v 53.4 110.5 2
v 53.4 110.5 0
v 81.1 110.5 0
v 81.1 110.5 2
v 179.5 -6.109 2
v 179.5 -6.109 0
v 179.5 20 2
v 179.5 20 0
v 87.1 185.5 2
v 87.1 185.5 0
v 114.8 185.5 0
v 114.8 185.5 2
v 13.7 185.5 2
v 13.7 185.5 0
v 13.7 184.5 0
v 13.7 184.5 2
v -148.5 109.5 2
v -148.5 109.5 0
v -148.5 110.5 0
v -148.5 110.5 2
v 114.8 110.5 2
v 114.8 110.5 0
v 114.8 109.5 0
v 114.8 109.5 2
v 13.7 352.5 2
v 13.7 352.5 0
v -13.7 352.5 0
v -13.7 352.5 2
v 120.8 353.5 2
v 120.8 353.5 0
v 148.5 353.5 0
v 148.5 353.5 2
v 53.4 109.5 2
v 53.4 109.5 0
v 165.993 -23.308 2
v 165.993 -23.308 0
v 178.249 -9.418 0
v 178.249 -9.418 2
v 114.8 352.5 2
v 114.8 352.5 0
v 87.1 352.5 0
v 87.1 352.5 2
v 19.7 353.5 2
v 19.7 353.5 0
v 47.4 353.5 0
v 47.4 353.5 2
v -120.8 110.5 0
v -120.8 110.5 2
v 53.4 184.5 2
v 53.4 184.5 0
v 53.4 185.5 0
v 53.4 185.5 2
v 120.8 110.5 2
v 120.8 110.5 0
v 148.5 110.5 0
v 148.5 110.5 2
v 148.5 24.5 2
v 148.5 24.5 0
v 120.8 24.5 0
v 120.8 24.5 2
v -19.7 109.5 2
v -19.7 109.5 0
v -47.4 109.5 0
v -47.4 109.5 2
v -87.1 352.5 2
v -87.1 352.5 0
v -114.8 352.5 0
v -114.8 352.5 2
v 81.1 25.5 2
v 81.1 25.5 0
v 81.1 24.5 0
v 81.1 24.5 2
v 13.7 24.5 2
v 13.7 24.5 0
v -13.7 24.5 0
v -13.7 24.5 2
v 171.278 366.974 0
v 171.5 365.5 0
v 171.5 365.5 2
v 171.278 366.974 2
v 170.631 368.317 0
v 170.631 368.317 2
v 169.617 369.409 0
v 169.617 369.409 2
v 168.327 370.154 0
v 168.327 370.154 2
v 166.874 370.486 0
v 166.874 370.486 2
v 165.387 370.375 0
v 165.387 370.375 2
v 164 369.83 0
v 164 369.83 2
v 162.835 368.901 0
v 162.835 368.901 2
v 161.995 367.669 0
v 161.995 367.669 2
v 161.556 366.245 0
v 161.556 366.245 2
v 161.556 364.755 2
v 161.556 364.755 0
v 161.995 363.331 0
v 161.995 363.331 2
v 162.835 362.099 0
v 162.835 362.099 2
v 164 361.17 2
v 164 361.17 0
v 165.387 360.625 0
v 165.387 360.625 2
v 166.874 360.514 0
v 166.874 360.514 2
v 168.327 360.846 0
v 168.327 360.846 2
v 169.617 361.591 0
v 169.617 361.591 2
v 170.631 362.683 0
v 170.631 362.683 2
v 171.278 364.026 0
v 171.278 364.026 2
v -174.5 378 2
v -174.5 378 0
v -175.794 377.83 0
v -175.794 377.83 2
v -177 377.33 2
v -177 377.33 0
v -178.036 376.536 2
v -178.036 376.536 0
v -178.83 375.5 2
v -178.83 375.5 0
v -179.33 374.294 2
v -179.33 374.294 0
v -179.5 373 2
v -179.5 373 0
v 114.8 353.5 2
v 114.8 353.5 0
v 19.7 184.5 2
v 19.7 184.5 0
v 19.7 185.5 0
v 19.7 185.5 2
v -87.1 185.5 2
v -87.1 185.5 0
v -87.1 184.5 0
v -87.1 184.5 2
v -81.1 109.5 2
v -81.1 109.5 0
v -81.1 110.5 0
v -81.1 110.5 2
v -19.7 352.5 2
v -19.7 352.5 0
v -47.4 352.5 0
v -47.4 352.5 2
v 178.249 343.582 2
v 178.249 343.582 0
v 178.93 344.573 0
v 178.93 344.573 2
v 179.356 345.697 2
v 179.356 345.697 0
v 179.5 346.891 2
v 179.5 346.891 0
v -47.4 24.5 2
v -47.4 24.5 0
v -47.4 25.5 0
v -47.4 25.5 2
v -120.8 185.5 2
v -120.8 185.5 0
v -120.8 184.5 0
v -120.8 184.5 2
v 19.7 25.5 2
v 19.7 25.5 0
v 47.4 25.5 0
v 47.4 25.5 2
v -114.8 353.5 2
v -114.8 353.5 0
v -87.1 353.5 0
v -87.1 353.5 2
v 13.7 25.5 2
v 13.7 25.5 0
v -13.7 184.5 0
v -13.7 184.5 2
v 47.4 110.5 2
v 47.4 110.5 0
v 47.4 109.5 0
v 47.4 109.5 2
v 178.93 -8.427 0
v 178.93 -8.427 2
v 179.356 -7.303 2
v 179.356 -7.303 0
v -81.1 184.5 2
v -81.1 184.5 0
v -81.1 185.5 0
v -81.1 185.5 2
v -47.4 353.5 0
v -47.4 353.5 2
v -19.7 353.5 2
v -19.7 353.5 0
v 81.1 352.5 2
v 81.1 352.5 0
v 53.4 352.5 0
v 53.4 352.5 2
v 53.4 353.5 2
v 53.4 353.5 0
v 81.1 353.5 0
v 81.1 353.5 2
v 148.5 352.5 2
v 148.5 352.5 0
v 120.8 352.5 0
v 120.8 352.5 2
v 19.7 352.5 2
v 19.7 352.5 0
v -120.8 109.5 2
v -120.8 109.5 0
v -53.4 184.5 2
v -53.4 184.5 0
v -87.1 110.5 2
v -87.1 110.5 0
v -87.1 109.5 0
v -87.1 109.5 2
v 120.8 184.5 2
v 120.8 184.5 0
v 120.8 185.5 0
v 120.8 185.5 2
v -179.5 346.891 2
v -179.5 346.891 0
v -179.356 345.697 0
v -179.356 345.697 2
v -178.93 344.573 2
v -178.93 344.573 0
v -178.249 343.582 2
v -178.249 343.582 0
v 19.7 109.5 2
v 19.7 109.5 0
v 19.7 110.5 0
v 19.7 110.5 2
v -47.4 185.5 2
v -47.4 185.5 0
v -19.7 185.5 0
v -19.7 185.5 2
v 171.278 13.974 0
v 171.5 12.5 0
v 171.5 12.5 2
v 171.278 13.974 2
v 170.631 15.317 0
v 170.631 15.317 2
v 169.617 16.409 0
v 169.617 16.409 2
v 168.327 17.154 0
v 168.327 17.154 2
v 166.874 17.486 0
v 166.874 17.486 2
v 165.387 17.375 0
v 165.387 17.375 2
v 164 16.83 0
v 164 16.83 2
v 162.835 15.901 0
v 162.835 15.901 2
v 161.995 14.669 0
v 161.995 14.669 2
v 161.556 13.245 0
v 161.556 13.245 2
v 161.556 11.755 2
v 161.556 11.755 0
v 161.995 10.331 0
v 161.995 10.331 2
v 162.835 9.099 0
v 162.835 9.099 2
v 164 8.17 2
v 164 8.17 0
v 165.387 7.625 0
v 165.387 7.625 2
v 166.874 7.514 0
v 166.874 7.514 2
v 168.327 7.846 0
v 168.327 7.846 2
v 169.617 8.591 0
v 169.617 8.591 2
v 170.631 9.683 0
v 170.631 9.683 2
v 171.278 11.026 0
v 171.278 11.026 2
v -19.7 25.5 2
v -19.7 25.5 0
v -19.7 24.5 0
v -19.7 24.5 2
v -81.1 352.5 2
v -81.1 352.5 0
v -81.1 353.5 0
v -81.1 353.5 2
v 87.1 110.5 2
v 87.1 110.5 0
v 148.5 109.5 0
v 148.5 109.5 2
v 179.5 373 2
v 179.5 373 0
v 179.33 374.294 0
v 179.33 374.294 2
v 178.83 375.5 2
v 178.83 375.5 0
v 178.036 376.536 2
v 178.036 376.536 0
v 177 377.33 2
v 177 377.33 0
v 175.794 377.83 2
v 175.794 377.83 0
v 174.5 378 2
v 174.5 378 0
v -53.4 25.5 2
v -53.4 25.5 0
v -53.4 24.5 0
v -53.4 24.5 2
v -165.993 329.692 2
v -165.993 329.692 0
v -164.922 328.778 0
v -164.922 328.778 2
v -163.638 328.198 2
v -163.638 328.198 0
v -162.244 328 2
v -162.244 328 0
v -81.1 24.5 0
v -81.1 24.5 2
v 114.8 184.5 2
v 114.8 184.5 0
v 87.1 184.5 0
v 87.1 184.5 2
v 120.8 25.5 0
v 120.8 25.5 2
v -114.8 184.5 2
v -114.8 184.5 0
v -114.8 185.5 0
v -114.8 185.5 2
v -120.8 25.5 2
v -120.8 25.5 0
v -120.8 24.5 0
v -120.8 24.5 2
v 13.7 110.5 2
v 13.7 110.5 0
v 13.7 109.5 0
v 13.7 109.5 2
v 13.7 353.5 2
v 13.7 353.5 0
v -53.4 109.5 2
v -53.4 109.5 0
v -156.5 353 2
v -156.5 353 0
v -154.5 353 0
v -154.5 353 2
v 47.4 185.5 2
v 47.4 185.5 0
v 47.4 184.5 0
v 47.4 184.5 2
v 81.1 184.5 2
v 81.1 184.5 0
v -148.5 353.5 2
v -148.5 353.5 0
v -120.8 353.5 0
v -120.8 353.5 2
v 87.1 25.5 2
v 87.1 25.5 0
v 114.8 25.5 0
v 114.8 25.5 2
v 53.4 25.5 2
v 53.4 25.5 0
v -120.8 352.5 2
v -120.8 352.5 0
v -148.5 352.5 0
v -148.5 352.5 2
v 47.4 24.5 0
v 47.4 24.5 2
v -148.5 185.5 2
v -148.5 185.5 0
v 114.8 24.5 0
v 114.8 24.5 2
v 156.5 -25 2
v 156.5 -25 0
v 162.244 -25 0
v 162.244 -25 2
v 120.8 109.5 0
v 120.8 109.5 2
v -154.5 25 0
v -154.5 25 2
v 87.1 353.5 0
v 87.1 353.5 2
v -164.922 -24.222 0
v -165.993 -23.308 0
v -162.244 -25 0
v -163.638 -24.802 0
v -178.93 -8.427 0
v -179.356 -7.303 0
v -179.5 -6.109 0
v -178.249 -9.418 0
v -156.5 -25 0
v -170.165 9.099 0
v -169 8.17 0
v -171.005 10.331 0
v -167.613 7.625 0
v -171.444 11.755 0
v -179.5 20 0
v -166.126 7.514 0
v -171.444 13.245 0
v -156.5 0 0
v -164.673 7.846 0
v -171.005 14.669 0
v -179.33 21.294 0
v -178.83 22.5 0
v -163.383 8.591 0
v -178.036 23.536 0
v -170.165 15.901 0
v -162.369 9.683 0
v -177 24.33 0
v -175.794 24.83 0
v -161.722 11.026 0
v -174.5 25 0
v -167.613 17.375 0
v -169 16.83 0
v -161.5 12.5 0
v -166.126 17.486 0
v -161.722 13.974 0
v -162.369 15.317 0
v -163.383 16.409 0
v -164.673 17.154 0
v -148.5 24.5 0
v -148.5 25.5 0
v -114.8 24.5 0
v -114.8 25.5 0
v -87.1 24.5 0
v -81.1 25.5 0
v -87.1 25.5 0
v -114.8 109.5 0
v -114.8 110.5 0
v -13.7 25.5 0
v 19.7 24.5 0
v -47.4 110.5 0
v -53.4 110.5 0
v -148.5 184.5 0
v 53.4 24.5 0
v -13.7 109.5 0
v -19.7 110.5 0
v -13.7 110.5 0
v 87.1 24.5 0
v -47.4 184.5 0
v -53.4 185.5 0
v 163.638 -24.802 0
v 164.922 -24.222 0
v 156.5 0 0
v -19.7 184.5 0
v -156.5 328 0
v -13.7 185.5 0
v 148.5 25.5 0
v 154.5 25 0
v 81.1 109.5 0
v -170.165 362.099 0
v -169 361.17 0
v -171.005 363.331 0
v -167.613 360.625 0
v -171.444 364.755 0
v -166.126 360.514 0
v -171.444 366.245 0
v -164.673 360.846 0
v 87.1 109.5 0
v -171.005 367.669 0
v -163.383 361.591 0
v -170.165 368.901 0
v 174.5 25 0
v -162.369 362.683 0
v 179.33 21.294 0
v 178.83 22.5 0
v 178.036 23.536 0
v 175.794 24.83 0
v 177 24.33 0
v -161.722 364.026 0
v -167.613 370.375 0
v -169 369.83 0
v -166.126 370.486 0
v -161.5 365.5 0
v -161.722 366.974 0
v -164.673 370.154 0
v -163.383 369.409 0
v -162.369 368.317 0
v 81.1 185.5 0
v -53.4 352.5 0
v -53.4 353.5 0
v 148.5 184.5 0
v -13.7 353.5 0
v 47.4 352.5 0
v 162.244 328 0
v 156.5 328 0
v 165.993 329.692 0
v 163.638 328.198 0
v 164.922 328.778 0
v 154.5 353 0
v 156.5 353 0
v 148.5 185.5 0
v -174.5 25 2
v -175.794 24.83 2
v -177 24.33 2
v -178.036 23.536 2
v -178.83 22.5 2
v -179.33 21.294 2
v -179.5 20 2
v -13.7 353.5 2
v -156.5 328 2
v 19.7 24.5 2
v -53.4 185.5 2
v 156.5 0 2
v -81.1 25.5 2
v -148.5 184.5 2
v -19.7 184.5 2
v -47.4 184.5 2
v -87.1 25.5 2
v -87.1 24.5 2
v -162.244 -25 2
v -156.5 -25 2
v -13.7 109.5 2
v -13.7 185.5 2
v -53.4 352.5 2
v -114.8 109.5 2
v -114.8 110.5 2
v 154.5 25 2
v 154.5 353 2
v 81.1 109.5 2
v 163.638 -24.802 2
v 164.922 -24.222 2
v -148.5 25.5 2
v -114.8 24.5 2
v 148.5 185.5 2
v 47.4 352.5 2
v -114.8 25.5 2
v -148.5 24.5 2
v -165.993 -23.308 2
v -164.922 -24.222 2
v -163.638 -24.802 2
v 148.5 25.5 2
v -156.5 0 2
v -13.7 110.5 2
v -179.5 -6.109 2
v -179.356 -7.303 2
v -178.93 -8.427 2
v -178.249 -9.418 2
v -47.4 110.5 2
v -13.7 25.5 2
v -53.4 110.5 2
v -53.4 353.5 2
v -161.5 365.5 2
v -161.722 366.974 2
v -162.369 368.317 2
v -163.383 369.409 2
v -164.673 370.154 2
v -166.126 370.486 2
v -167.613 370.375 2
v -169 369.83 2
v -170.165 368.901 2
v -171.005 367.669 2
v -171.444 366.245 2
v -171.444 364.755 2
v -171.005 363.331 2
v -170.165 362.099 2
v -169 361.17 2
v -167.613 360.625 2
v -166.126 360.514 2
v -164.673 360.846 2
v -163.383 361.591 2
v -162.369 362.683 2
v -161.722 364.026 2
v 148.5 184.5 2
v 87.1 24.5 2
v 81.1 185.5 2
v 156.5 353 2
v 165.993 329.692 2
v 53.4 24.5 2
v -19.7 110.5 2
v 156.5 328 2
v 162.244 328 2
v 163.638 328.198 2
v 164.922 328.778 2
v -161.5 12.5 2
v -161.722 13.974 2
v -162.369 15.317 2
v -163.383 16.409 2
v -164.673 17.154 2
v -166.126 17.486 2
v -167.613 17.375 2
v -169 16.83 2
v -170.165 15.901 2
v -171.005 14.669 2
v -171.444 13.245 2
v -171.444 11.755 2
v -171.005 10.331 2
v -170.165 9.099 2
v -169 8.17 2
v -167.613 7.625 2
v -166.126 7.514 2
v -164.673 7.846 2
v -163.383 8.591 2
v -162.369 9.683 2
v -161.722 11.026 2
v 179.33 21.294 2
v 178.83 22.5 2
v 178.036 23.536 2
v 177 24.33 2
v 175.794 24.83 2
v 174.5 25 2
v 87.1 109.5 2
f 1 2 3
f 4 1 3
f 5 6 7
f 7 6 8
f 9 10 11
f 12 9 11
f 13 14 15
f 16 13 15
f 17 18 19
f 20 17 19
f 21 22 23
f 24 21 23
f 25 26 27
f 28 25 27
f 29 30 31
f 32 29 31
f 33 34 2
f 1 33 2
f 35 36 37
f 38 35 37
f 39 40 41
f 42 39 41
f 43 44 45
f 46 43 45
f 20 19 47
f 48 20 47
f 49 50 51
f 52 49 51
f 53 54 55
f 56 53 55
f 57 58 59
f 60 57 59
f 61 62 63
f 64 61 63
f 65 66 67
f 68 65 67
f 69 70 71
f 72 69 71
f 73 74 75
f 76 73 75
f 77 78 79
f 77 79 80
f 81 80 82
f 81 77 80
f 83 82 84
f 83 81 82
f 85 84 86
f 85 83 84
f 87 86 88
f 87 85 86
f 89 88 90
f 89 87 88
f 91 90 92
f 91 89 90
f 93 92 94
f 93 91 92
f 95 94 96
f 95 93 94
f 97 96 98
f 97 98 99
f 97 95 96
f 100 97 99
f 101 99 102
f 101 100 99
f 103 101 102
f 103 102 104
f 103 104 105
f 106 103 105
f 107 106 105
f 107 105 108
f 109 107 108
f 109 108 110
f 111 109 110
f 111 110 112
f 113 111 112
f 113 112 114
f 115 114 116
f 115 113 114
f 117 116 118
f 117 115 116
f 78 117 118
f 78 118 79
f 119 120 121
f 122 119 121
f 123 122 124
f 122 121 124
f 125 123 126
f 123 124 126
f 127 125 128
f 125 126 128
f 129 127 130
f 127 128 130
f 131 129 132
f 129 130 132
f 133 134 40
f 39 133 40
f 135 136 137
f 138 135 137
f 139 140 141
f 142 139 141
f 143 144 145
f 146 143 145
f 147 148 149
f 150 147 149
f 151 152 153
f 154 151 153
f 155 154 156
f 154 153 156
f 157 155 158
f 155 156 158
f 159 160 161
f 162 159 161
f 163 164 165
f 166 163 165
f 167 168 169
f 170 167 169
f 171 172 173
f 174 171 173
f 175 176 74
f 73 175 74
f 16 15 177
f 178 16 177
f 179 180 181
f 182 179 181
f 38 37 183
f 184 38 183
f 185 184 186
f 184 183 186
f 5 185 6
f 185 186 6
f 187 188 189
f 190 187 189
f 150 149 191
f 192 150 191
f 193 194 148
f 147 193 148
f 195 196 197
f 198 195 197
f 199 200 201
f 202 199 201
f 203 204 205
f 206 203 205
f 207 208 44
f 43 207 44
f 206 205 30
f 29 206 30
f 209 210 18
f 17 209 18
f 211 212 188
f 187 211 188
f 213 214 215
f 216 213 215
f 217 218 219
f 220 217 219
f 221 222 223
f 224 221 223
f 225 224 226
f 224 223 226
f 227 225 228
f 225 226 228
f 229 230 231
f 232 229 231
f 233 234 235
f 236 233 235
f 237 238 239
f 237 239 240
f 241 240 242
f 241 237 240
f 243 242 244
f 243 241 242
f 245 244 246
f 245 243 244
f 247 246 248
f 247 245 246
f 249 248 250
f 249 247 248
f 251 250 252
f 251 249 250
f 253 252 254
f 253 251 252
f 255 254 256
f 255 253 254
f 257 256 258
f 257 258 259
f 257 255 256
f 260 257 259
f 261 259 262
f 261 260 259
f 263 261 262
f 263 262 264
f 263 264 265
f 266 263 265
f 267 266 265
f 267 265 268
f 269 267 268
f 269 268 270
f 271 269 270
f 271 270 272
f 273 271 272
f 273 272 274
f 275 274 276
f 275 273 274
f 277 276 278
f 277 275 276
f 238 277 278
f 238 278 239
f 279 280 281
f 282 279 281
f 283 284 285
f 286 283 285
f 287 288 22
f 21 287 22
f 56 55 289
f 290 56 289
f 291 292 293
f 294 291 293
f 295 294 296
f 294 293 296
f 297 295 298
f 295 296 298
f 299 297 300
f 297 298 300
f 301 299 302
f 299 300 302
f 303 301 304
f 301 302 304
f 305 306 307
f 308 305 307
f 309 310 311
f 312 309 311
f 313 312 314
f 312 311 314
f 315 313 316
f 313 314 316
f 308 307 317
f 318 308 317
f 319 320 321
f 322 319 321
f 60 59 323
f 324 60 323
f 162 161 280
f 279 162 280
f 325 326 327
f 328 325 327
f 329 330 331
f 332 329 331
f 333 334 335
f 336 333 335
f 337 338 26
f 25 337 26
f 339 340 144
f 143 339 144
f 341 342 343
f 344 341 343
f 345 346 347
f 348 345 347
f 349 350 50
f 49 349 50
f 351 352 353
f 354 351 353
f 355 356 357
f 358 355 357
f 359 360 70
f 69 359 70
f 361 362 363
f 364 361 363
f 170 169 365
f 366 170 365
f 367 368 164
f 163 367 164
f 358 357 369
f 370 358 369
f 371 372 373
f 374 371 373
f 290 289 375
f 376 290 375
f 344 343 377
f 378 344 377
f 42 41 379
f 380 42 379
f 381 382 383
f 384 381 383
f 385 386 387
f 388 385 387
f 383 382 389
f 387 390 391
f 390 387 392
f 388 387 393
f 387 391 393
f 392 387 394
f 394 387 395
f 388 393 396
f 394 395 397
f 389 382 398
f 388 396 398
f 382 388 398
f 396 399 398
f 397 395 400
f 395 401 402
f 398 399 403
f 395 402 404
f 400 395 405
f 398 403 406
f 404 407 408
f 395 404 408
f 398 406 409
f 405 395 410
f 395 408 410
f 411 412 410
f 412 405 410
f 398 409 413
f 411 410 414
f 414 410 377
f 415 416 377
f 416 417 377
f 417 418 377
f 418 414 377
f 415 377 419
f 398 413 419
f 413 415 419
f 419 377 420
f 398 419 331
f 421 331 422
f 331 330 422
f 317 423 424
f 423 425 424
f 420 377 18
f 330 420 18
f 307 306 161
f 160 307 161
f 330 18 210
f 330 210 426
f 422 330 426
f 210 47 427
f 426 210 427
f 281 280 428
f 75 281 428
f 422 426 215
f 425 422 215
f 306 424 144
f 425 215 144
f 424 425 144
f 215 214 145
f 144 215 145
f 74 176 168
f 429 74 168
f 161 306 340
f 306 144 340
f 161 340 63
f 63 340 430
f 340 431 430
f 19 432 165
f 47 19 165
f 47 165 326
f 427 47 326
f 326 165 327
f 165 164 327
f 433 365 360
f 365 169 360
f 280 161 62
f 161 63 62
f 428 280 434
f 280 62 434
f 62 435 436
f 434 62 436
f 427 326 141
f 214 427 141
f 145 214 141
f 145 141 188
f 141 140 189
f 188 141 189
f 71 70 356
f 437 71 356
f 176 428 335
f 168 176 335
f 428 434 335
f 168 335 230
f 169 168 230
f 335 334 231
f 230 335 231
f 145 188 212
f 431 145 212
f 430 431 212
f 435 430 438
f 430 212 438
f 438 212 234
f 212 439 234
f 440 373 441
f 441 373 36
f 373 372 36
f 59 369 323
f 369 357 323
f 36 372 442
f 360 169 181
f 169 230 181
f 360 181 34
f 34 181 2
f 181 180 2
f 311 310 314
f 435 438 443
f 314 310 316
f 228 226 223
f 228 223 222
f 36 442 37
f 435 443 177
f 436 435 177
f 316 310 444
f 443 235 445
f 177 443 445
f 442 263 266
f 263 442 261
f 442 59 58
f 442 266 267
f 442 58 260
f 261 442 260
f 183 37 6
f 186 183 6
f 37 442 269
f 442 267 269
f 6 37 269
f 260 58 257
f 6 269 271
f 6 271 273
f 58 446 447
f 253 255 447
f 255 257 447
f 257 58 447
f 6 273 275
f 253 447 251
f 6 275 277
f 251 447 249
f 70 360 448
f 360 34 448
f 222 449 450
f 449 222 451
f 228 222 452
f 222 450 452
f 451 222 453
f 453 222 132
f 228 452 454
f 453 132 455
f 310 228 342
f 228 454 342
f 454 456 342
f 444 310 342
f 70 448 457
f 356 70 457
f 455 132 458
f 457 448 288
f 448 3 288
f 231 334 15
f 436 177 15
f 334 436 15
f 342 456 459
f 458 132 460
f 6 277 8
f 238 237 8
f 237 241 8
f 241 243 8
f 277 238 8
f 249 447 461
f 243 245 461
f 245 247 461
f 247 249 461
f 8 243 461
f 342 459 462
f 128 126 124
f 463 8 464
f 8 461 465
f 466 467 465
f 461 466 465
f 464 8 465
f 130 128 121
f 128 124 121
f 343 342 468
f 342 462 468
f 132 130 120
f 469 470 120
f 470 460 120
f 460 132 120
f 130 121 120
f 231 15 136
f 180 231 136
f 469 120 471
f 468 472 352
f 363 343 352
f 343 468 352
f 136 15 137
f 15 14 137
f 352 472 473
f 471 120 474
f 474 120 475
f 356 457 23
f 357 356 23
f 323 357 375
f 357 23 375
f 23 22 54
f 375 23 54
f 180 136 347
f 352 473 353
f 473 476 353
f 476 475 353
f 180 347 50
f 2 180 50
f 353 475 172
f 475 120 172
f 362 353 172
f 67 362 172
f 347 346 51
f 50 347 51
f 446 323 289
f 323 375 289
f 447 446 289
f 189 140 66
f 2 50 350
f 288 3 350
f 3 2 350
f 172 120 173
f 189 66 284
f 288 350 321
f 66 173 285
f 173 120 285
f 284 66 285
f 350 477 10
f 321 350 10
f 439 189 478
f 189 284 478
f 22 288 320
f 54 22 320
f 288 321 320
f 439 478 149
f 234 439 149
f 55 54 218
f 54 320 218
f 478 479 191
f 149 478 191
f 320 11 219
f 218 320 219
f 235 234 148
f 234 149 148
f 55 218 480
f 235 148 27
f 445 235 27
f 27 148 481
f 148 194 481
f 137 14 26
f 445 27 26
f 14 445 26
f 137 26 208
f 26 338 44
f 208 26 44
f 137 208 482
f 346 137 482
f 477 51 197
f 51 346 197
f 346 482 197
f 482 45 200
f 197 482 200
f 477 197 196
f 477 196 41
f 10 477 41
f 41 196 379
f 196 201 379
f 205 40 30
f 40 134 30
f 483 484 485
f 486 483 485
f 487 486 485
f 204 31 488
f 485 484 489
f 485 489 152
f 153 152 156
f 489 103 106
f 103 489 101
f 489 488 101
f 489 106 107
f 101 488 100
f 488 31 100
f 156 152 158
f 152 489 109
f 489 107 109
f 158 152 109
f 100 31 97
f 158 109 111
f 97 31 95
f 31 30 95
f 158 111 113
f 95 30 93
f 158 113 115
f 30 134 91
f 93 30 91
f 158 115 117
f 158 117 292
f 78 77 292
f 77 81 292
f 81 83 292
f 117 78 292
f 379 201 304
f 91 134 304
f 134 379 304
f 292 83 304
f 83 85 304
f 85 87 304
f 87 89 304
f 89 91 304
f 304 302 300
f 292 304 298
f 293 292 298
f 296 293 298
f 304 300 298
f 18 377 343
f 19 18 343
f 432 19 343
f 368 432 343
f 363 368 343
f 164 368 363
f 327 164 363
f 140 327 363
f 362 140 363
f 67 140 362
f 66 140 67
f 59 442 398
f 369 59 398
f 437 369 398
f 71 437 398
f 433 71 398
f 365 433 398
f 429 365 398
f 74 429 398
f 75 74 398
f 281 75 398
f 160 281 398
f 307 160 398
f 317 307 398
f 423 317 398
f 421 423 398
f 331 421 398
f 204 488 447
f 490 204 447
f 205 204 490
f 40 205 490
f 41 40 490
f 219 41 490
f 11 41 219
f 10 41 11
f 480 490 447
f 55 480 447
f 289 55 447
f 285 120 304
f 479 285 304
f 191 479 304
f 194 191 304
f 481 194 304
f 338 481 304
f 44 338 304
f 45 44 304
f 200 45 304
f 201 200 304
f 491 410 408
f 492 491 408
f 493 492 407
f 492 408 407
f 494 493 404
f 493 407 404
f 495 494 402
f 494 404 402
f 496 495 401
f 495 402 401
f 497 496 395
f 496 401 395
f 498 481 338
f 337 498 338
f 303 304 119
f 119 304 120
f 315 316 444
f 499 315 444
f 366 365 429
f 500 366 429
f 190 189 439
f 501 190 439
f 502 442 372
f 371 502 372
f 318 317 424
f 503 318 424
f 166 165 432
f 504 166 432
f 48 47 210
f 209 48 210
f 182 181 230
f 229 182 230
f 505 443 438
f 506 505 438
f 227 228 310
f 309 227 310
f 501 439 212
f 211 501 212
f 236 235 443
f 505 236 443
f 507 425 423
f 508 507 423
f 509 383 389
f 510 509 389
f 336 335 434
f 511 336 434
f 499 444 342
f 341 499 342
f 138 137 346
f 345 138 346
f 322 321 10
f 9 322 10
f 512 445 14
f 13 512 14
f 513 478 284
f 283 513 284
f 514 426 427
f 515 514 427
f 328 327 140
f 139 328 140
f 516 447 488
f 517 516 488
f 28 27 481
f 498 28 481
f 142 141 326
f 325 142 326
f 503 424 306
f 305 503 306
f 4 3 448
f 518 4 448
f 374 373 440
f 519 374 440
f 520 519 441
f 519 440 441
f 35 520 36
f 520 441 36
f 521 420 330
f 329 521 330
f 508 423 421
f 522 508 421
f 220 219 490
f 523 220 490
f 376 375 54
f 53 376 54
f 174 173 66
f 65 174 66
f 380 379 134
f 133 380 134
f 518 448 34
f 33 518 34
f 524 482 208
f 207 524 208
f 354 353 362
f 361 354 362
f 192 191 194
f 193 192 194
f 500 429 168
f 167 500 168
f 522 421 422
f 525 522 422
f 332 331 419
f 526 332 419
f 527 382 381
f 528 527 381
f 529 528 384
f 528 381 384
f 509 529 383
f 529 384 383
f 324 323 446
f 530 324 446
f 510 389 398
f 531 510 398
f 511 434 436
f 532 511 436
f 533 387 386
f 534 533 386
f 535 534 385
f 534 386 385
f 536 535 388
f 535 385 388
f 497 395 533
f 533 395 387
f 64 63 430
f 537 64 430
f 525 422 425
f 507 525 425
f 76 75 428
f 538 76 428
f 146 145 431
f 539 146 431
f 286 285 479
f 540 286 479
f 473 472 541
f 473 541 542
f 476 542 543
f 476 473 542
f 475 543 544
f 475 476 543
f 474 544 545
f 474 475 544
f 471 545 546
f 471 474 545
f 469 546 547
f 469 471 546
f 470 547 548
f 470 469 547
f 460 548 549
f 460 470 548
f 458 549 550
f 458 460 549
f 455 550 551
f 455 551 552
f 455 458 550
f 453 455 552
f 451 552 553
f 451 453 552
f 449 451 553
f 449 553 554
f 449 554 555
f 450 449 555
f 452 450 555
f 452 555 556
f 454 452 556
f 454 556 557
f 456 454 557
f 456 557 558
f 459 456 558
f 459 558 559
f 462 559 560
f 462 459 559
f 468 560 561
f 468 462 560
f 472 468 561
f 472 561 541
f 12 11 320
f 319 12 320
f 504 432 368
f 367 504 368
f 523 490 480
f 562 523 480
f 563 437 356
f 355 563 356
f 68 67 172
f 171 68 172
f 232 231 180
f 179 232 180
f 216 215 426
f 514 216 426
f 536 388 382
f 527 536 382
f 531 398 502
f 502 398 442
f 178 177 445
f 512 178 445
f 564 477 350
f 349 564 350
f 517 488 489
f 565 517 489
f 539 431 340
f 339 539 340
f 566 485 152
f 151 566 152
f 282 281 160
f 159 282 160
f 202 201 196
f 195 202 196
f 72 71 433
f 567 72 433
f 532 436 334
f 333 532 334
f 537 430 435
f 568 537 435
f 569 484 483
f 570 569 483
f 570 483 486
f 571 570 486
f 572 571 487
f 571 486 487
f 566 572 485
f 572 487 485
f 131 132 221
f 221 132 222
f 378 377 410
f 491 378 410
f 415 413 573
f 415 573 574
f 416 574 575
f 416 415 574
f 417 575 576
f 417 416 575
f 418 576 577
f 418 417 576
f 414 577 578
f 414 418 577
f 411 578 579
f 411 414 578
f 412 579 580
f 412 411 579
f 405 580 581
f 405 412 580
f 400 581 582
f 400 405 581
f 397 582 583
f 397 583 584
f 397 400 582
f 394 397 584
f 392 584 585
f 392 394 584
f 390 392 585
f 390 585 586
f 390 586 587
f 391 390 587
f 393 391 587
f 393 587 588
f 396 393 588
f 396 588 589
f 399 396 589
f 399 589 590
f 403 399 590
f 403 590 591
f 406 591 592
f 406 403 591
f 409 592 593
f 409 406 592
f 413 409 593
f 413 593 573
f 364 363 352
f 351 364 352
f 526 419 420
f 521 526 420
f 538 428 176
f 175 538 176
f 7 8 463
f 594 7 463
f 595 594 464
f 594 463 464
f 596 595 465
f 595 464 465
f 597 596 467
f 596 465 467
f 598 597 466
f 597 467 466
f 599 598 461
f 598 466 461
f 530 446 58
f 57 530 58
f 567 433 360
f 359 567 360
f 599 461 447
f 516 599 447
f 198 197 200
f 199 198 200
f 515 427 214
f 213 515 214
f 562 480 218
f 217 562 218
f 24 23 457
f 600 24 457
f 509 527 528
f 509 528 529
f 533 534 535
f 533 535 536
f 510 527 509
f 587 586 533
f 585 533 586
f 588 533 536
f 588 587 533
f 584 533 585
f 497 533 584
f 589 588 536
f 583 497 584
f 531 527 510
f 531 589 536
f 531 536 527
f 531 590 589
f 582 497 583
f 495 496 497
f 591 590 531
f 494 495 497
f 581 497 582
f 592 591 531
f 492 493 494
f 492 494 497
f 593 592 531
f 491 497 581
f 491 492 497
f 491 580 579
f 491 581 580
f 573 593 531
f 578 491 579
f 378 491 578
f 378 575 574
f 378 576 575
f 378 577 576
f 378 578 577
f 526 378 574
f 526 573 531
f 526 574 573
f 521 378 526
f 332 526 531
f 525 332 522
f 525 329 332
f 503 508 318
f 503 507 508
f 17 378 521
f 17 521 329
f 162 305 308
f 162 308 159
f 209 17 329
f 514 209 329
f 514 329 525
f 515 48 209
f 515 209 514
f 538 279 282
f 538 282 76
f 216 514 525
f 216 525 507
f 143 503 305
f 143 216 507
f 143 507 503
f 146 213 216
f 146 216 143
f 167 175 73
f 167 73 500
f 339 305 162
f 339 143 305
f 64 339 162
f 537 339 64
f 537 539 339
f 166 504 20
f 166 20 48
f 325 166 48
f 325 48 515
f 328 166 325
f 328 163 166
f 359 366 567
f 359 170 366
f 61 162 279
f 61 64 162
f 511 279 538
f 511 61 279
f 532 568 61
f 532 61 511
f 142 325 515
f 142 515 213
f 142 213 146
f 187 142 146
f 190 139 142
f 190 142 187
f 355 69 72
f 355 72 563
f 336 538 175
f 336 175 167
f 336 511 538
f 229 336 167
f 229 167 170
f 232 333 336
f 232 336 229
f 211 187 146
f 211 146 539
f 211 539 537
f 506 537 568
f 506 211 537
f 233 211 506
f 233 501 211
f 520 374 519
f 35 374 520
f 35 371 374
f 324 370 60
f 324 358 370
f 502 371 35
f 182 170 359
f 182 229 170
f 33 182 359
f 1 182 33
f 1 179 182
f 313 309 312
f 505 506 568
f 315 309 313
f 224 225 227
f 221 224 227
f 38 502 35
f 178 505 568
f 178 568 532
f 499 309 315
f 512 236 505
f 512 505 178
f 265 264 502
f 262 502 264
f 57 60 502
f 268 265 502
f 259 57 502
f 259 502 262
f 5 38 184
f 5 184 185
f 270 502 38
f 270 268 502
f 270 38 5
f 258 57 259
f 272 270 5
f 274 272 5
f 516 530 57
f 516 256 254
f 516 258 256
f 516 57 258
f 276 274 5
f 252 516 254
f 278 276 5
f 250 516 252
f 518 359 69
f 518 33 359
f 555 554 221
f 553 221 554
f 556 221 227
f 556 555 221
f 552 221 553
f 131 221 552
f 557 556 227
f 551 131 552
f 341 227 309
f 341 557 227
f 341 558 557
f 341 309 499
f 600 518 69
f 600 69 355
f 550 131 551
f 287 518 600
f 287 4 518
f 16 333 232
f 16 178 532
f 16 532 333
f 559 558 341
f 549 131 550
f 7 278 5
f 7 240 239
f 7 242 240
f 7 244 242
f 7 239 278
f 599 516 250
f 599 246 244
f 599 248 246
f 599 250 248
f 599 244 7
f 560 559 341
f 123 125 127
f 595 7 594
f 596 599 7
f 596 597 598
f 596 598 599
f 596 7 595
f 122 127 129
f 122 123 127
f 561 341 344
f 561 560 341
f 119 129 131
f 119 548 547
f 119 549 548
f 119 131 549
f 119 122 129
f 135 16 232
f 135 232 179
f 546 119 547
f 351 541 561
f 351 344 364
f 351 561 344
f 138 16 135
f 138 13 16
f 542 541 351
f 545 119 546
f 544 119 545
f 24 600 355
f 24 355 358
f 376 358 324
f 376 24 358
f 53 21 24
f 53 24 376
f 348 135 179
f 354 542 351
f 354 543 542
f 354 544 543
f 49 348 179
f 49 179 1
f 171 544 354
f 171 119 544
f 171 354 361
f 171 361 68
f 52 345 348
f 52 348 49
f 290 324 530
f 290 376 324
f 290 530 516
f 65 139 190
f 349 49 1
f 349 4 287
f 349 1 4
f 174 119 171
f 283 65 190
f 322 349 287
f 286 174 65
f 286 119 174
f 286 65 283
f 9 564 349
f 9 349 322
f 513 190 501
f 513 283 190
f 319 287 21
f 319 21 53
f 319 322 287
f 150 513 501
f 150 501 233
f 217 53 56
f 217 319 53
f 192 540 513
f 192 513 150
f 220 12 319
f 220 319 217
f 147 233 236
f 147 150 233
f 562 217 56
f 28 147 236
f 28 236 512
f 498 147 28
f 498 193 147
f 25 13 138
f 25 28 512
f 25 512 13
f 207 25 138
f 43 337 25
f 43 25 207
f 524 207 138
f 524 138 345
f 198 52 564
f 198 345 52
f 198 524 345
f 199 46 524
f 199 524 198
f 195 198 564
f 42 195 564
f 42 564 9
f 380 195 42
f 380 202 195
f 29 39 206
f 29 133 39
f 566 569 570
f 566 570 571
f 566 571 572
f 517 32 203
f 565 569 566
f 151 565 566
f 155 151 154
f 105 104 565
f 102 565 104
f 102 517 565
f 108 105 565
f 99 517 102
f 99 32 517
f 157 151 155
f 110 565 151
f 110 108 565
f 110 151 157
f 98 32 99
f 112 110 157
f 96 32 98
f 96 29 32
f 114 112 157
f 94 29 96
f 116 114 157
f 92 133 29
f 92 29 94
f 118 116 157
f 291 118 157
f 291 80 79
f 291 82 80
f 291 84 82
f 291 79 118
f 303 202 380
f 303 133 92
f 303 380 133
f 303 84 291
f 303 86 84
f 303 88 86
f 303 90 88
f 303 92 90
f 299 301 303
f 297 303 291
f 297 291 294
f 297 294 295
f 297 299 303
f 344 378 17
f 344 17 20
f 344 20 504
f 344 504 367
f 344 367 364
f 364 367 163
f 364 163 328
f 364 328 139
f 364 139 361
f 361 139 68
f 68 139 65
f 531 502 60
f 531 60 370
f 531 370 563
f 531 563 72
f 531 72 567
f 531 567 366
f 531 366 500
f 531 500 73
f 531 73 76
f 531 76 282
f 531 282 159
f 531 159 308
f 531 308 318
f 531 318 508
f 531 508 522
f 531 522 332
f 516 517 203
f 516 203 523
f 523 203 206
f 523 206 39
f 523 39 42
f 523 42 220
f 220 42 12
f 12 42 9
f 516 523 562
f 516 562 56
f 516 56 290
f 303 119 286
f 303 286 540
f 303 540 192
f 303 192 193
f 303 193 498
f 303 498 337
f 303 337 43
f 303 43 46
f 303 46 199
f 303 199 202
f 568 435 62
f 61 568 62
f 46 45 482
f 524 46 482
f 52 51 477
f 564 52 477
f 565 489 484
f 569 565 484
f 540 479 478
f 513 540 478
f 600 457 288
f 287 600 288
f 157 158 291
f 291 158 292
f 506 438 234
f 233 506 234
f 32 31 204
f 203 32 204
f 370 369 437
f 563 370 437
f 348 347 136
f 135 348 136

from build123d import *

# Parameters (mm, degrees)
F0_R     = 5
F1_DEPTH = 2


with BuildPart() as f1:
    # F0 (on Top) → F1 (new body)
    with BuildSketch(Plane.XY):
        with BuildLine():
            Line((-156.5, 353), (-154.5, 353))
            Line((-154.5, 353), (-154.5, 378))
            Line((-154.5, 378), (-174.5, 378))
            ThreePointArc((-174.5, 378), (-178.0355339059, 376.5355339059), (-179.5, 373))
            Line((-179.5, 373), (-179.5, 353))
            Line((-179.5, 353), (-156.5, 353))
        make_face()
        with Locations((-166.5, 365.5)):
            Circle(F0_R, mode=Mode.SUBTRACT)
        with BuildLine():
            Line((-156.5, 328), (-156.5, 353))
            Line((-156.5, 353), (-179.5, 353))
            Line((-179.5, 353), (-179.5, 346.8905226992))
            ThreePointArc((-179.5, 346.8905226992), (-179.1768550536, 345.1221825713), (-178.2491892768, 343.5824145137))
            Line((-178.2491892768, 343.5824145137), (-165.9928457187, 329.6918918146))
            ThreePointArc((-165.9928457187, 329.6918918146), (-164.300287069, 328.4425587811), (-162.2436564419, 328))
            Line((-162.2436564419, 328), (-156.5, 328))
        make_face()
        Polygon((-154.5, 378), (-154.5, 353), (-148.5, 353), (-148.5, 353.5), (-120.8, 353.5), (-120.8, 353), (-114.8, 353), (-114.8, 353.5), (-87.1, 353.5), (-87.1, 353), (-81.1, 353), (-81.1, 353.5), (-53.4, 353.5), (-53.4, 353), (-47.4, 353), (-47.4, 353.5), (-19.7, 353.5), (-19.7, 353), (-13.7, 353), (-13.7, 353.5), (0, 353.5), (0, 378), align=None)
        Polygon((-154.5, 353), (-154.5, 110), (-148.5, 110), (-148.5, 110.5), (-120.8, 110.5), (-120.8, 110), (-114.8, 110), (-114.8, 110.5), (-87.1, 110.5), (-87.1, 110), (-81.1, 110), (-81.1, 110.5), (-53.4, 110.5), (-53.4, 110), (-47.4, 110), (-47.4, 110.5), (-19.7, 110.5), (-19.7, 110), (-13.7, 110), (-13.7, 110.5), (0, 110.5), (0, 184.5), (-13.7, 184.5), (-13.7, 185), (-13.7, 185.5), (0, 185.5), (0, 352.5), (-13.7, 352.5), (-13.7, 353), (-19.7, 353), (-19.7, 352.5), (-47.4, 352.5), (-47.4, 353), (-53.4, 353), (-53.4, 352.5), (-81.1, 352.5), (-81.1, 353), (-87.1, 353), (-87.1, 352.5), (-114.8, 352.5), (-114.8, 353), (-120.8, 353), (-120.8, 352.5), (-148.5, 352.5), (-148.5, 353), align=None)
        Polygon((-120.8, 185.5), (-120.8, 185), (-120.8, 184.5), (-148.5, 184.5), (-148.5, 185), (-148.5, 185.5), align=None, mode=Mode.SUBTRACT)
        Polygon((-87.1, 185.5), (-87.1, 185), (-87.1, 184.5), (-114.8, 184.5), (-114.8, 185), (-114.8, 185.5), align=None, mode=Mode.SUBTRACT)
        Polygon((-53.4, 185.5), (-53.4, 185), (-53.4, 184.5), (-81.1, 184.5), (-81.1, 185), (-81.1, 185.5), align=None, mode=Mode.SUBTRACT)
        Polygon((-19.7, 185.5), (-19.7, 185), (-19.7, 184.5), (-47.4, 184.5), (-47.4, 185), (-47.4, 185.5), align=None, mode=Mode.SUBTRACT)
        Polygon((148.5, 353), (154.5, 353), (154.5, 378), (0, 378), (0, 353.5), (13.7, 353.5), (13.7, 353), (19.7, 353), (19.7, 353.5), (47.4, 353.5), (47.4, 353), (53.4, 353), (53.4, 353.5), (81.1, 353.5), (81.1, 353), (87.1, 353), (87.1, 353.5), (114.8, 353.5), (114.8, 353), (120.8, 353), (120.8, 353.5), (148.5, 353.5), align=None)
        Polygon((148.5, 110), (154.5, 110), (154.5, 353), (148.5, 353), (148.5, 352.5), (120.8, 352.5), (120.8, 353), (114.8, 353), (114.8, 352.5), (87.1, 352.5), (87.1, 353), (81.1, 353), (81.1, 352.5), (53.4, 352.5), (53.4, 353), (47.4, 353), (47.4, 352.5), (19.7, 352.5), (19.7, 353), (13.7, 353), (13.7, 352.5), (0, 352.5), (0, 185.5), (13.7, 185.5), (13.7, 185), (13.7, 184.5), (0, 184.5), (0, 110.5), (13.7, 110.5), (13.7, 110), (19.7, 110), (19.7, 110.5), (47.4, 110.5), (47.4, 110), (53.4, 110), (53.4, 110.5), (81.1, 110.5), (81.1, 110), (87.1, 110), (87.1, 110.5), (114.8, 110.5), (114.8, 110), (120.8, 110), (120.8, 110.5), (148.5, 110.5), align=None)
        Polygon((19.7, 184.5), (19.7, 185), (19.7, 185.5), (47.4, 185.5), (47.4, 185), (47.4, 184.5), align=None, mode=Mode.SUBTRACT)
        Polygon((53.4, 184.5), (53.4, 185), (53.4, 185.5), (81.1, 185.5), (81.1, 185), (81.1, 184.5), align=None, mode=Mode.SUBTRACT)
        Polygon((87.1, 184.5), (87.1, 185), (87.1, 185.5), (114.8, 185.5), (114.8, 185), (114.8, 184.5), align=None, mode=Mode.SUBTRACT)
        Polygon((120.8, 184.5), (120.8, 185), (120.8, 185.5), (148.5, 185.5), (148.5, 185), (148.5, 184.5), align=None, mode=Mode.SUBTRACT)
        with BuildLine():
            Line((154.5, 378), (154.5, 353))
            Line((154.5, 353), (156.5, 353))
            Line((156.5, 353), (179.5, 353))
            Line((179.5, 353), (179.5, 373))
            ThreePointArc((179.5, 373), (178.0355339059, 376.5355339059), (174.5, 378))
            Line((174.5, 378), (154.5, 378))
        make_face()
        with Locations((166.5, 365.5)):
            Circle(F0_R, mode=Mode.SUBTRACT)
        with BuildLine():
            Line((179.5, 353), (156.5, 353))
            Line((156.5, 353), (156.5, 328))
            Line((156.5, 328), (162.2436564419, 328))
            ThreePointArc((162.2436564419, 328), (164.300287069, 328.4425587811), (165.9928457187, 329.6918918146))
            Line((165.9928457187, 329.6918918146), (178.2491892768, 343.5824145137))
            ThreePointArc((178.2491892768, 343.5824145137), (179.1768550536, 345.1221825713), (179.5, 346.8905226992))
            Line((179.5, 346.8905226992), (179.5, 353))
        make_face()
        with BuildLine():
            Line((-156.5, -25), (-156.5, 0))
            Line((-156.5, 0), (-179.5, 0))
            Line((-179.5, 0), (-179.5, -6.1094773008))
            ThreePointArc((-179.5, -6.1094773008), (-179.1768550536, -7.8778174287), (-178.2491892768, -9.4175854863))
            Line((-178.2491892768, -9.4175854863), (-165.9928457187, -23.3081081854))
            ThreePointArc((-165.9928457187, -23.3081081854), (-164.300287069, -24.5574412189), (-162.2436564419, -25))
            Line((-162.2436564419, -25), (-156.5, -25))
        make_face()
        with BuildLine():
            Line((-156.5, 0), (-154.5, 0))
            Line((-154.5, 0), (-154.5, 25))
            Line((-154.5, 25), (-174.5, 25))
            ThreePointArc((-174.5, 25), (-178.0355339059, 23.5355339059), (-179.5, 20))
            Line((-179.5, 20), (-179.5, 0))
            Line((-179.5, 0), (-156.5, 0))
        make_face()
        with Locations((-166.5, 12.5)):
            Circle(F0_R, mode=Mode.SUBTRACT)
        Polygon((-154.5, 0), (0, 0), (0, 24.5), (-13.7, 24.5), (-13.7, 25), (-19.7, 25), (-19.7, 24.5), (-47.4, 24.5), (-47.4, 25), (-53.4, 25), (-53.4, 24.5), (-81.1, 24.5), (-81.1, 25), (-87.1, 25), (-87.1, 24.5), (-114.8, 24.5), (-114.8, 25), (-120.8, 25), (-120.8, 24.5), (-148.5, 24.5), (-148.5, 25), (-154.5, 25), align=None)
        Polygon((-154.5, 110), (-154.5, 25), (-148.5, 25), (-148.5, 25.5), (-120.8, 25.5), (-120.8, 25), (-114.8, 25), (-114.8, 25.5), (-87.1, 25.5), (-87.1, 25), (-81.1, 25), (-81.1, 25.5), (-53.4, 25.5), (-53.4, 25), (-47.4, 25), (-47.4, 25.5), (-19.7, 25.5), (-19.7, 25), (-13.7, 25), (-13.7, 25.5), (0, 25.5), (0, 109.5), (-13.7, 109.5), (-13.7, 110), (-19.7, 110), (-19.7, 109.5), (-47.4, 109.5), (-47.4, 110), (-53.4, 110), (-53.4, 109.5), (-81.1, 109.5), (-81.1, 110), (-87.1, 110), (-87.1, 109.5), (-114.8, 109.5), (-114.8, 110), (-120.8, 110), (-120.8, 109.5), (-148.5, 109.5), (-148.5, 110), align=None)
        Polygon((148.5, 25), (154.5, 25), (154.5, 110), (148.5, 110), (148.5, 109.5), (120.8, 109.5), (120.8, 110), (114.8, 110), (114.8, 109.5), (87.1, 109.5), (87.1, 110), (81.1, 110), (81.1, 109.5), (53.4, 109.5), (53.4, 110), (47.4, 110), (47.4, 109.5), (19.7, 109.5), (19.7, 110), (13.7, 110), (13.7, 109.5), (0, 109.5), (0, 25.5), (13.7, 25.5), (13.7, 25), (19.7, 25), (19.7, 25.5), (47.4, 25.5), (47.4, 25), (53.4, 25), (53.4, 25.5), (81.1, 25.5), (81.1, 25), (87.1, 25), (87.1, 25.5), (114.8, 25.5), (114.8, 25), (120.8, 25), (120.8, 25.5), (148.5, 25.5), align=None)
        Polygon((0, 24.5), (0, 0), (154.5, 0), (154.5, 25), (148.5, 25), (148.5, 24.5), (120.8, 24.5), (120.8, 25), (114.8, 25), (114.8, 24.5), (87.1, 24.5), (87.1, 25), (81.1, 25), (81.1, 24.5), (53.4, 24.5), (53.4, 25), (47.4, 25), (47.4, 24.5), (19.7, 24.5), (19.7, 25), (13.7, 25), (13.7, 24.5), align=None)
        with BuildLine():
            Line((154.5, 25), (154.5, 0))
            Line((154.5, 0), (156.5, 0))
            Line((156.5, 0), (179.5, 0))
            Line((179.5, 0), (179.5, 20))
            ThreePointArc((179.5, 20), (178.0355339059, 23.5355339059), (174.5, 25))
            Line((174.5, 25), (154.5, 25))
        make_face()
        with Locations((166.5, 12.5)):
            Circle(F0_R, mode=Mode.SUBTRACT)
        with BuildLine():
            Line((179.5, 0), (156.5, 0))
            Line((156.5, 0), (156.5, -25))
            Line((156.5, -25), (162.2436564419, -25))
            ThreePointArc((162.2436564419, -25), (164.300287069, -24.5574412189), (165.9928457187, -23.3081081854))
            Line((165.9928457187, -23.3081081854), (178.2491892768, -9.4175854863))
            ThreePointArc((178.2491892768, -9.4175854863), (179.1768550536, -7.8778174287), (179.5, -6.1094773008))
            Line((179.5, -6.1094773008), (179.5, 0))
        make_face()
    extrude(amount=F1_DEPTH)


solid = f1.part
